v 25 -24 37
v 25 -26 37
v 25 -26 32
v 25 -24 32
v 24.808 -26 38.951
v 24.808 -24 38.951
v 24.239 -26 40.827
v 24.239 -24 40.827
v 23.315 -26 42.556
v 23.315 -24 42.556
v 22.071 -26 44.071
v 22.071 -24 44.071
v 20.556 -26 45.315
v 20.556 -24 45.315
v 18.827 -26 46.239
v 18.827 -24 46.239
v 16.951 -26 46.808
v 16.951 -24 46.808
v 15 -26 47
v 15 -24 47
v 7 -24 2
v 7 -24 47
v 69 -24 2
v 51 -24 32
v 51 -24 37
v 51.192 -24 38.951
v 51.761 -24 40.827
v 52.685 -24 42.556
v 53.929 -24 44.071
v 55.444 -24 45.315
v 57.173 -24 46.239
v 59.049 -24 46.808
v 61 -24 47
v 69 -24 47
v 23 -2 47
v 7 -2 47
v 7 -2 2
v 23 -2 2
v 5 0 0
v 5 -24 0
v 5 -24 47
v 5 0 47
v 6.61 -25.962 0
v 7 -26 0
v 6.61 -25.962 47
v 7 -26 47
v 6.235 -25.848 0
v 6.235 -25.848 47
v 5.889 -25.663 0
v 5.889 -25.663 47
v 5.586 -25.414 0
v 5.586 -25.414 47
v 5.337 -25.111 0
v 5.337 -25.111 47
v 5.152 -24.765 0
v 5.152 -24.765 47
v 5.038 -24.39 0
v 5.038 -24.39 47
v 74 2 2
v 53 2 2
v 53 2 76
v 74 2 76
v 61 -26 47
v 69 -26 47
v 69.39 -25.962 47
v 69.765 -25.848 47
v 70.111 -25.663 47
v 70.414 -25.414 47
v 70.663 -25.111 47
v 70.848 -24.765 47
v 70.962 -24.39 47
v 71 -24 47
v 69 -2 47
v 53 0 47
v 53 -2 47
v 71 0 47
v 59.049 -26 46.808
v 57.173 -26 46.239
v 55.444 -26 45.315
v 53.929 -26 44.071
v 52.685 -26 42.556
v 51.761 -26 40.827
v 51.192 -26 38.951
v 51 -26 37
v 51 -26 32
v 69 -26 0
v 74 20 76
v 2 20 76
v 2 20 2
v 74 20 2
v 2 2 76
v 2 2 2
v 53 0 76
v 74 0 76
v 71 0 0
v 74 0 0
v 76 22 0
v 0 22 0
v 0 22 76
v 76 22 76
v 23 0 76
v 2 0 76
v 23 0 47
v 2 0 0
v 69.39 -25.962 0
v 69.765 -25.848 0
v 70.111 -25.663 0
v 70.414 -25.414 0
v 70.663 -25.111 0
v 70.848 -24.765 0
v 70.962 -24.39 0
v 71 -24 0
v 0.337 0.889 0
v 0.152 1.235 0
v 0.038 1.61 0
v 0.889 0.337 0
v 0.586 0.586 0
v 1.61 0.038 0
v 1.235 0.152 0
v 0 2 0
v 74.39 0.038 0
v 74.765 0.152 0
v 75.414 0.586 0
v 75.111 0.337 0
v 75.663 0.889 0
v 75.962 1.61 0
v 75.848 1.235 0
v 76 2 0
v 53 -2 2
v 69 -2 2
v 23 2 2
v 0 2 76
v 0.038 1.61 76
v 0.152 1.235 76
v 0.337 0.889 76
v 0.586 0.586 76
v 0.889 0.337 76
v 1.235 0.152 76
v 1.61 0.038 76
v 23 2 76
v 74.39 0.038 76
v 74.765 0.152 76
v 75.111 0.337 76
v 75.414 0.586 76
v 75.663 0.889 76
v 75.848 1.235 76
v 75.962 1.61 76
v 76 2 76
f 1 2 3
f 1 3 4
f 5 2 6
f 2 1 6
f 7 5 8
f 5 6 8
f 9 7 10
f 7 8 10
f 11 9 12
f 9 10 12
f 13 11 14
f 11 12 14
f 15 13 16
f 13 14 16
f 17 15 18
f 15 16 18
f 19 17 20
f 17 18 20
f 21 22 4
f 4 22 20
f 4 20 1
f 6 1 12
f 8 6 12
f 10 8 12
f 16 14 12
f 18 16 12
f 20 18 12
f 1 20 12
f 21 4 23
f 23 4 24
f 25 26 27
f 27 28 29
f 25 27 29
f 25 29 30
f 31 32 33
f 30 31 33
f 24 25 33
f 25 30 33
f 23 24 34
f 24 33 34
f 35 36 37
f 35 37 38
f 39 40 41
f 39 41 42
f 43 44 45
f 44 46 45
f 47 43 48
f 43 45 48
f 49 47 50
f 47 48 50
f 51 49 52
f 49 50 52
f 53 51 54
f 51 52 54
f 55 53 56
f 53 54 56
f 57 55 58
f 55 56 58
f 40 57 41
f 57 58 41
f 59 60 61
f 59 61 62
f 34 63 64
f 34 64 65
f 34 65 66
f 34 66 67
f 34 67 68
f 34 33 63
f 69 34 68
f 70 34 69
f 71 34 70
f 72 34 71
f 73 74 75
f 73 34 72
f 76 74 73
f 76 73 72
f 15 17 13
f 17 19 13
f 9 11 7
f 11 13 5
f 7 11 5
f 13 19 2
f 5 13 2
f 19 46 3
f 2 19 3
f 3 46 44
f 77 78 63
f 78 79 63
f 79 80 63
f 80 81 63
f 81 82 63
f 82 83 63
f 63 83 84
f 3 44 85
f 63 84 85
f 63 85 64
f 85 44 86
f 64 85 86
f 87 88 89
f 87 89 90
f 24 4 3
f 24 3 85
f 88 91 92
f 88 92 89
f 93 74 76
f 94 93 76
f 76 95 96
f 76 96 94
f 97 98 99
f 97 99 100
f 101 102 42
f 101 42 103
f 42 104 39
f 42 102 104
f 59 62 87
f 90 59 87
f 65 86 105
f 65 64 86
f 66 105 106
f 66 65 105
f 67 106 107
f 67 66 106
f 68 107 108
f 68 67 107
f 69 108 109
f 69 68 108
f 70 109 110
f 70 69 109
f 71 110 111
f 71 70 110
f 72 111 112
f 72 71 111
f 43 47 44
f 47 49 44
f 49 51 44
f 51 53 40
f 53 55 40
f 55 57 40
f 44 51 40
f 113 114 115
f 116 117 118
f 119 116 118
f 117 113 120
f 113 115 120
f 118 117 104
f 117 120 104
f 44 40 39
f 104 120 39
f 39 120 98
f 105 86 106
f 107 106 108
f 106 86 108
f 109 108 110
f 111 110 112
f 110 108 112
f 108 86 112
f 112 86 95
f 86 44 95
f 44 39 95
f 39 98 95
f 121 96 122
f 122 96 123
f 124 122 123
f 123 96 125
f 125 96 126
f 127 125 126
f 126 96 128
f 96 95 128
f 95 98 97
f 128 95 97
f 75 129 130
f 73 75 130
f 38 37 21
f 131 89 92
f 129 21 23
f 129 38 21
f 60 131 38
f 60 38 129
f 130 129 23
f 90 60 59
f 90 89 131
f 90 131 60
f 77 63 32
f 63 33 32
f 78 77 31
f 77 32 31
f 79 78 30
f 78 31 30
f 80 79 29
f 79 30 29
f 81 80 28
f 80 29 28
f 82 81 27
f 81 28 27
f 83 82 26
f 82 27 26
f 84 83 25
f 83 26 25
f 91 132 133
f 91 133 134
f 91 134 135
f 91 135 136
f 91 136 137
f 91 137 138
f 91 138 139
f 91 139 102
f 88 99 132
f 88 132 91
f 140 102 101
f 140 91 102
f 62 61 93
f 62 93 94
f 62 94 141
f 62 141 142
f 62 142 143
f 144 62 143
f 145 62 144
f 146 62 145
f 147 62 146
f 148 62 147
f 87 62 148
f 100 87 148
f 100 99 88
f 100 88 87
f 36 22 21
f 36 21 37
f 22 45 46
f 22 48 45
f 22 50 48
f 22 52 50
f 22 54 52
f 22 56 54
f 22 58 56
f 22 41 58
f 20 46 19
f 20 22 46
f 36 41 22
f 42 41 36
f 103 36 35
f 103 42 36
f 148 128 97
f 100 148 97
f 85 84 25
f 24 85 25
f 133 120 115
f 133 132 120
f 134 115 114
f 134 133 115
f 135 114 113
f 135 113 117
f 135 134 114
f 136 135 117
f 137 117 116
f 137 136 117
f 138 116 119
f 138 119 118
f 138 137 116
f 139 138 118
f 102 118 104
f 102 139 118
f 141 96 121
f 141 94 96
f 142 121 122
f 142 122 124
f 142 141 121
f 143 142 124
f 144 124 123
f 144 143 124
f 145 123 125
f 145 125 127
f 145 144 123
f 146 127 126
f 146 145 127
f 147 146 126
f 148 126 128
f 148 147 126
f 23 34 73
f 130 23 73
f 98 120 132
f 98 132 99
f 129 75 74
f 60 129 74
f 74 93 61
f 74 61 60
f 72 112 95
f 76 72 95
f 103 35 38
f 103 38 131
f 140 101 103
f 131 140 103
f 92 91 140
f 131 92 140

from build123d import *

# Parameters (mm, degrees)
SKETCH_W        = 76
SKETCH_H        = 22
PAD_DEPTH       = 76
SKETCH001_W     = 66
SKETCH001_H     = 26
PAD001_DEPTH    = 47
SKETCH002_W     = 62
SKETCH002_H     = 22
POCKET_DEPTH    = 45
SKETCH003_W     = 72
SKETCH003_H     = 18
POCKET001_DEPTH = 74
SKETCH004_W     = 30
SKETCH004_H     = 2
POCKET002_DEPTH = 45
SKETCH005_W     = 30
SKETCH005_H     = 2
POCKET003_DEPTH = 74
SKETCH006_W     = 26
SKETCH006_H     = 2
POCKET004_DEPTH = 15
FILLET_R        = 10
FILLET001_R     = 10
FILLET002_R     = 2
FILLET003_R     = 2
FILLET004_R     = 2
FILLET005_R     = 2


with BuildPart() as part:
    # Sketch → Pad (new body)
    with BuildSketch(Plane.XY):
        with Locations((38, 11)):
            Rectangle(SKETCH_W, SKETCH_H)
    extrude(amount=PAD_DEPTH)

    # Sketch001 → Pad001 (join)
    with BuildSketch(Plane.XY):
        with Locations((38, -13)):
            Rectangle(SKETCH001_W, SKETCH001_H)
    extrude(amount=PAD001_DEPTH)

    # Sketch002 (on Face4 of Pad001) → Pocket (cut)
    with BuildSketch(Plane.XY.offset(47)):
        with Locations((38, -13)):
            Rectangle(SKETCH002_W, SKETCH002_H)
    extrude(amount=-POCKET_DEPTH, mode=Mode.SUBTRACT)

    # Sketch003 (on Face7 of Pocket) → Pocket001 (cut)
    with BuildSketch(Plane.XY.offset(76)):
        with Locations((38, 11)):
            Rectangle(SKETCH003_W, SKETCH003_H)
    extrude(amount=-POCKET001_DEPTH, mode=Mode.SUBTRACT)

    # Sketch004 (on Face4 of Pocket001) → Pocket002 (cut)
    with BuildSketch(Plane.XY.offset(47)):
        with Locations((38, -1)):
            Rectangle(SKETCH004_W, SKETCH004_H)
    extrude(amount=-POCKET002_DEPTH, mode=Mode.SUBTRACT)

    # Sketch005 (on Face8 of Pocket002) → Pocket003 (cut)
    with BuildSketch(Plane.XY.offset(76)):
        with Locations((38, 1)):
            Rectangle(SKETCH005_W, SKETCH005_H)
    extrude(amount=-POCKET003_DEPTH, mode=Mode.SUBTRACT)

    # Sketch006 (on Face4 of Pocket003) → Pocket004 (cut)
    with BuildSketch(Plane.XY.offset(47)):
        with Locations((38, -25)):
            Rectangle(SKETCH006_W, SKETCH006_H)
    extrude(amount=-POCKET004_DEPTH, mode=Mode.SUBTRACT)

    # Fillet
    fillet_edges = [part.edges().sort_by_distance(p)[0] for p in [
        (51, -25, 47),
    ]]
    fillet(fillet_edges, radius=FILLET_R)

    # Fillet001
    fillet001_edges = [part.edges().sort_by_distance(p)[0] for p in [
        (25, -25, 47),
    ]]
    fillet(fillet001_edges, radius=FILLET001_R)

    # Fillet002
    fillet002_edges = [part.edges().sort_by_distance(p)[0] for p in [
        (5, -26, 23.5),
    ]]
    fillet(fillet002_edges, radius=FILLET002_R)

    # Fillet003
    fillet003_edges = [part.edges().sort_by_distance(p)[0] for p in [
        (71, -26, 23.5),
    ]]
    fillet(fillet003_edges, radius=FILLET003_R)

    # Fillet004
    fillet004_edges = [part.edges().sort_by_distance(p)[0] for p in [
        (76, 0, 38),
    ]]
    fillet(fillet004_edges, radius=FILLET004_R)

    # Fillet005
    fillet005_edges = [part.edges().sort_by_distance(p)[0] for p in [
        (0, 0, 38),
    ]]
    fillet(fillet005_edges, radius=FILLET005_R)


solid = part.part
